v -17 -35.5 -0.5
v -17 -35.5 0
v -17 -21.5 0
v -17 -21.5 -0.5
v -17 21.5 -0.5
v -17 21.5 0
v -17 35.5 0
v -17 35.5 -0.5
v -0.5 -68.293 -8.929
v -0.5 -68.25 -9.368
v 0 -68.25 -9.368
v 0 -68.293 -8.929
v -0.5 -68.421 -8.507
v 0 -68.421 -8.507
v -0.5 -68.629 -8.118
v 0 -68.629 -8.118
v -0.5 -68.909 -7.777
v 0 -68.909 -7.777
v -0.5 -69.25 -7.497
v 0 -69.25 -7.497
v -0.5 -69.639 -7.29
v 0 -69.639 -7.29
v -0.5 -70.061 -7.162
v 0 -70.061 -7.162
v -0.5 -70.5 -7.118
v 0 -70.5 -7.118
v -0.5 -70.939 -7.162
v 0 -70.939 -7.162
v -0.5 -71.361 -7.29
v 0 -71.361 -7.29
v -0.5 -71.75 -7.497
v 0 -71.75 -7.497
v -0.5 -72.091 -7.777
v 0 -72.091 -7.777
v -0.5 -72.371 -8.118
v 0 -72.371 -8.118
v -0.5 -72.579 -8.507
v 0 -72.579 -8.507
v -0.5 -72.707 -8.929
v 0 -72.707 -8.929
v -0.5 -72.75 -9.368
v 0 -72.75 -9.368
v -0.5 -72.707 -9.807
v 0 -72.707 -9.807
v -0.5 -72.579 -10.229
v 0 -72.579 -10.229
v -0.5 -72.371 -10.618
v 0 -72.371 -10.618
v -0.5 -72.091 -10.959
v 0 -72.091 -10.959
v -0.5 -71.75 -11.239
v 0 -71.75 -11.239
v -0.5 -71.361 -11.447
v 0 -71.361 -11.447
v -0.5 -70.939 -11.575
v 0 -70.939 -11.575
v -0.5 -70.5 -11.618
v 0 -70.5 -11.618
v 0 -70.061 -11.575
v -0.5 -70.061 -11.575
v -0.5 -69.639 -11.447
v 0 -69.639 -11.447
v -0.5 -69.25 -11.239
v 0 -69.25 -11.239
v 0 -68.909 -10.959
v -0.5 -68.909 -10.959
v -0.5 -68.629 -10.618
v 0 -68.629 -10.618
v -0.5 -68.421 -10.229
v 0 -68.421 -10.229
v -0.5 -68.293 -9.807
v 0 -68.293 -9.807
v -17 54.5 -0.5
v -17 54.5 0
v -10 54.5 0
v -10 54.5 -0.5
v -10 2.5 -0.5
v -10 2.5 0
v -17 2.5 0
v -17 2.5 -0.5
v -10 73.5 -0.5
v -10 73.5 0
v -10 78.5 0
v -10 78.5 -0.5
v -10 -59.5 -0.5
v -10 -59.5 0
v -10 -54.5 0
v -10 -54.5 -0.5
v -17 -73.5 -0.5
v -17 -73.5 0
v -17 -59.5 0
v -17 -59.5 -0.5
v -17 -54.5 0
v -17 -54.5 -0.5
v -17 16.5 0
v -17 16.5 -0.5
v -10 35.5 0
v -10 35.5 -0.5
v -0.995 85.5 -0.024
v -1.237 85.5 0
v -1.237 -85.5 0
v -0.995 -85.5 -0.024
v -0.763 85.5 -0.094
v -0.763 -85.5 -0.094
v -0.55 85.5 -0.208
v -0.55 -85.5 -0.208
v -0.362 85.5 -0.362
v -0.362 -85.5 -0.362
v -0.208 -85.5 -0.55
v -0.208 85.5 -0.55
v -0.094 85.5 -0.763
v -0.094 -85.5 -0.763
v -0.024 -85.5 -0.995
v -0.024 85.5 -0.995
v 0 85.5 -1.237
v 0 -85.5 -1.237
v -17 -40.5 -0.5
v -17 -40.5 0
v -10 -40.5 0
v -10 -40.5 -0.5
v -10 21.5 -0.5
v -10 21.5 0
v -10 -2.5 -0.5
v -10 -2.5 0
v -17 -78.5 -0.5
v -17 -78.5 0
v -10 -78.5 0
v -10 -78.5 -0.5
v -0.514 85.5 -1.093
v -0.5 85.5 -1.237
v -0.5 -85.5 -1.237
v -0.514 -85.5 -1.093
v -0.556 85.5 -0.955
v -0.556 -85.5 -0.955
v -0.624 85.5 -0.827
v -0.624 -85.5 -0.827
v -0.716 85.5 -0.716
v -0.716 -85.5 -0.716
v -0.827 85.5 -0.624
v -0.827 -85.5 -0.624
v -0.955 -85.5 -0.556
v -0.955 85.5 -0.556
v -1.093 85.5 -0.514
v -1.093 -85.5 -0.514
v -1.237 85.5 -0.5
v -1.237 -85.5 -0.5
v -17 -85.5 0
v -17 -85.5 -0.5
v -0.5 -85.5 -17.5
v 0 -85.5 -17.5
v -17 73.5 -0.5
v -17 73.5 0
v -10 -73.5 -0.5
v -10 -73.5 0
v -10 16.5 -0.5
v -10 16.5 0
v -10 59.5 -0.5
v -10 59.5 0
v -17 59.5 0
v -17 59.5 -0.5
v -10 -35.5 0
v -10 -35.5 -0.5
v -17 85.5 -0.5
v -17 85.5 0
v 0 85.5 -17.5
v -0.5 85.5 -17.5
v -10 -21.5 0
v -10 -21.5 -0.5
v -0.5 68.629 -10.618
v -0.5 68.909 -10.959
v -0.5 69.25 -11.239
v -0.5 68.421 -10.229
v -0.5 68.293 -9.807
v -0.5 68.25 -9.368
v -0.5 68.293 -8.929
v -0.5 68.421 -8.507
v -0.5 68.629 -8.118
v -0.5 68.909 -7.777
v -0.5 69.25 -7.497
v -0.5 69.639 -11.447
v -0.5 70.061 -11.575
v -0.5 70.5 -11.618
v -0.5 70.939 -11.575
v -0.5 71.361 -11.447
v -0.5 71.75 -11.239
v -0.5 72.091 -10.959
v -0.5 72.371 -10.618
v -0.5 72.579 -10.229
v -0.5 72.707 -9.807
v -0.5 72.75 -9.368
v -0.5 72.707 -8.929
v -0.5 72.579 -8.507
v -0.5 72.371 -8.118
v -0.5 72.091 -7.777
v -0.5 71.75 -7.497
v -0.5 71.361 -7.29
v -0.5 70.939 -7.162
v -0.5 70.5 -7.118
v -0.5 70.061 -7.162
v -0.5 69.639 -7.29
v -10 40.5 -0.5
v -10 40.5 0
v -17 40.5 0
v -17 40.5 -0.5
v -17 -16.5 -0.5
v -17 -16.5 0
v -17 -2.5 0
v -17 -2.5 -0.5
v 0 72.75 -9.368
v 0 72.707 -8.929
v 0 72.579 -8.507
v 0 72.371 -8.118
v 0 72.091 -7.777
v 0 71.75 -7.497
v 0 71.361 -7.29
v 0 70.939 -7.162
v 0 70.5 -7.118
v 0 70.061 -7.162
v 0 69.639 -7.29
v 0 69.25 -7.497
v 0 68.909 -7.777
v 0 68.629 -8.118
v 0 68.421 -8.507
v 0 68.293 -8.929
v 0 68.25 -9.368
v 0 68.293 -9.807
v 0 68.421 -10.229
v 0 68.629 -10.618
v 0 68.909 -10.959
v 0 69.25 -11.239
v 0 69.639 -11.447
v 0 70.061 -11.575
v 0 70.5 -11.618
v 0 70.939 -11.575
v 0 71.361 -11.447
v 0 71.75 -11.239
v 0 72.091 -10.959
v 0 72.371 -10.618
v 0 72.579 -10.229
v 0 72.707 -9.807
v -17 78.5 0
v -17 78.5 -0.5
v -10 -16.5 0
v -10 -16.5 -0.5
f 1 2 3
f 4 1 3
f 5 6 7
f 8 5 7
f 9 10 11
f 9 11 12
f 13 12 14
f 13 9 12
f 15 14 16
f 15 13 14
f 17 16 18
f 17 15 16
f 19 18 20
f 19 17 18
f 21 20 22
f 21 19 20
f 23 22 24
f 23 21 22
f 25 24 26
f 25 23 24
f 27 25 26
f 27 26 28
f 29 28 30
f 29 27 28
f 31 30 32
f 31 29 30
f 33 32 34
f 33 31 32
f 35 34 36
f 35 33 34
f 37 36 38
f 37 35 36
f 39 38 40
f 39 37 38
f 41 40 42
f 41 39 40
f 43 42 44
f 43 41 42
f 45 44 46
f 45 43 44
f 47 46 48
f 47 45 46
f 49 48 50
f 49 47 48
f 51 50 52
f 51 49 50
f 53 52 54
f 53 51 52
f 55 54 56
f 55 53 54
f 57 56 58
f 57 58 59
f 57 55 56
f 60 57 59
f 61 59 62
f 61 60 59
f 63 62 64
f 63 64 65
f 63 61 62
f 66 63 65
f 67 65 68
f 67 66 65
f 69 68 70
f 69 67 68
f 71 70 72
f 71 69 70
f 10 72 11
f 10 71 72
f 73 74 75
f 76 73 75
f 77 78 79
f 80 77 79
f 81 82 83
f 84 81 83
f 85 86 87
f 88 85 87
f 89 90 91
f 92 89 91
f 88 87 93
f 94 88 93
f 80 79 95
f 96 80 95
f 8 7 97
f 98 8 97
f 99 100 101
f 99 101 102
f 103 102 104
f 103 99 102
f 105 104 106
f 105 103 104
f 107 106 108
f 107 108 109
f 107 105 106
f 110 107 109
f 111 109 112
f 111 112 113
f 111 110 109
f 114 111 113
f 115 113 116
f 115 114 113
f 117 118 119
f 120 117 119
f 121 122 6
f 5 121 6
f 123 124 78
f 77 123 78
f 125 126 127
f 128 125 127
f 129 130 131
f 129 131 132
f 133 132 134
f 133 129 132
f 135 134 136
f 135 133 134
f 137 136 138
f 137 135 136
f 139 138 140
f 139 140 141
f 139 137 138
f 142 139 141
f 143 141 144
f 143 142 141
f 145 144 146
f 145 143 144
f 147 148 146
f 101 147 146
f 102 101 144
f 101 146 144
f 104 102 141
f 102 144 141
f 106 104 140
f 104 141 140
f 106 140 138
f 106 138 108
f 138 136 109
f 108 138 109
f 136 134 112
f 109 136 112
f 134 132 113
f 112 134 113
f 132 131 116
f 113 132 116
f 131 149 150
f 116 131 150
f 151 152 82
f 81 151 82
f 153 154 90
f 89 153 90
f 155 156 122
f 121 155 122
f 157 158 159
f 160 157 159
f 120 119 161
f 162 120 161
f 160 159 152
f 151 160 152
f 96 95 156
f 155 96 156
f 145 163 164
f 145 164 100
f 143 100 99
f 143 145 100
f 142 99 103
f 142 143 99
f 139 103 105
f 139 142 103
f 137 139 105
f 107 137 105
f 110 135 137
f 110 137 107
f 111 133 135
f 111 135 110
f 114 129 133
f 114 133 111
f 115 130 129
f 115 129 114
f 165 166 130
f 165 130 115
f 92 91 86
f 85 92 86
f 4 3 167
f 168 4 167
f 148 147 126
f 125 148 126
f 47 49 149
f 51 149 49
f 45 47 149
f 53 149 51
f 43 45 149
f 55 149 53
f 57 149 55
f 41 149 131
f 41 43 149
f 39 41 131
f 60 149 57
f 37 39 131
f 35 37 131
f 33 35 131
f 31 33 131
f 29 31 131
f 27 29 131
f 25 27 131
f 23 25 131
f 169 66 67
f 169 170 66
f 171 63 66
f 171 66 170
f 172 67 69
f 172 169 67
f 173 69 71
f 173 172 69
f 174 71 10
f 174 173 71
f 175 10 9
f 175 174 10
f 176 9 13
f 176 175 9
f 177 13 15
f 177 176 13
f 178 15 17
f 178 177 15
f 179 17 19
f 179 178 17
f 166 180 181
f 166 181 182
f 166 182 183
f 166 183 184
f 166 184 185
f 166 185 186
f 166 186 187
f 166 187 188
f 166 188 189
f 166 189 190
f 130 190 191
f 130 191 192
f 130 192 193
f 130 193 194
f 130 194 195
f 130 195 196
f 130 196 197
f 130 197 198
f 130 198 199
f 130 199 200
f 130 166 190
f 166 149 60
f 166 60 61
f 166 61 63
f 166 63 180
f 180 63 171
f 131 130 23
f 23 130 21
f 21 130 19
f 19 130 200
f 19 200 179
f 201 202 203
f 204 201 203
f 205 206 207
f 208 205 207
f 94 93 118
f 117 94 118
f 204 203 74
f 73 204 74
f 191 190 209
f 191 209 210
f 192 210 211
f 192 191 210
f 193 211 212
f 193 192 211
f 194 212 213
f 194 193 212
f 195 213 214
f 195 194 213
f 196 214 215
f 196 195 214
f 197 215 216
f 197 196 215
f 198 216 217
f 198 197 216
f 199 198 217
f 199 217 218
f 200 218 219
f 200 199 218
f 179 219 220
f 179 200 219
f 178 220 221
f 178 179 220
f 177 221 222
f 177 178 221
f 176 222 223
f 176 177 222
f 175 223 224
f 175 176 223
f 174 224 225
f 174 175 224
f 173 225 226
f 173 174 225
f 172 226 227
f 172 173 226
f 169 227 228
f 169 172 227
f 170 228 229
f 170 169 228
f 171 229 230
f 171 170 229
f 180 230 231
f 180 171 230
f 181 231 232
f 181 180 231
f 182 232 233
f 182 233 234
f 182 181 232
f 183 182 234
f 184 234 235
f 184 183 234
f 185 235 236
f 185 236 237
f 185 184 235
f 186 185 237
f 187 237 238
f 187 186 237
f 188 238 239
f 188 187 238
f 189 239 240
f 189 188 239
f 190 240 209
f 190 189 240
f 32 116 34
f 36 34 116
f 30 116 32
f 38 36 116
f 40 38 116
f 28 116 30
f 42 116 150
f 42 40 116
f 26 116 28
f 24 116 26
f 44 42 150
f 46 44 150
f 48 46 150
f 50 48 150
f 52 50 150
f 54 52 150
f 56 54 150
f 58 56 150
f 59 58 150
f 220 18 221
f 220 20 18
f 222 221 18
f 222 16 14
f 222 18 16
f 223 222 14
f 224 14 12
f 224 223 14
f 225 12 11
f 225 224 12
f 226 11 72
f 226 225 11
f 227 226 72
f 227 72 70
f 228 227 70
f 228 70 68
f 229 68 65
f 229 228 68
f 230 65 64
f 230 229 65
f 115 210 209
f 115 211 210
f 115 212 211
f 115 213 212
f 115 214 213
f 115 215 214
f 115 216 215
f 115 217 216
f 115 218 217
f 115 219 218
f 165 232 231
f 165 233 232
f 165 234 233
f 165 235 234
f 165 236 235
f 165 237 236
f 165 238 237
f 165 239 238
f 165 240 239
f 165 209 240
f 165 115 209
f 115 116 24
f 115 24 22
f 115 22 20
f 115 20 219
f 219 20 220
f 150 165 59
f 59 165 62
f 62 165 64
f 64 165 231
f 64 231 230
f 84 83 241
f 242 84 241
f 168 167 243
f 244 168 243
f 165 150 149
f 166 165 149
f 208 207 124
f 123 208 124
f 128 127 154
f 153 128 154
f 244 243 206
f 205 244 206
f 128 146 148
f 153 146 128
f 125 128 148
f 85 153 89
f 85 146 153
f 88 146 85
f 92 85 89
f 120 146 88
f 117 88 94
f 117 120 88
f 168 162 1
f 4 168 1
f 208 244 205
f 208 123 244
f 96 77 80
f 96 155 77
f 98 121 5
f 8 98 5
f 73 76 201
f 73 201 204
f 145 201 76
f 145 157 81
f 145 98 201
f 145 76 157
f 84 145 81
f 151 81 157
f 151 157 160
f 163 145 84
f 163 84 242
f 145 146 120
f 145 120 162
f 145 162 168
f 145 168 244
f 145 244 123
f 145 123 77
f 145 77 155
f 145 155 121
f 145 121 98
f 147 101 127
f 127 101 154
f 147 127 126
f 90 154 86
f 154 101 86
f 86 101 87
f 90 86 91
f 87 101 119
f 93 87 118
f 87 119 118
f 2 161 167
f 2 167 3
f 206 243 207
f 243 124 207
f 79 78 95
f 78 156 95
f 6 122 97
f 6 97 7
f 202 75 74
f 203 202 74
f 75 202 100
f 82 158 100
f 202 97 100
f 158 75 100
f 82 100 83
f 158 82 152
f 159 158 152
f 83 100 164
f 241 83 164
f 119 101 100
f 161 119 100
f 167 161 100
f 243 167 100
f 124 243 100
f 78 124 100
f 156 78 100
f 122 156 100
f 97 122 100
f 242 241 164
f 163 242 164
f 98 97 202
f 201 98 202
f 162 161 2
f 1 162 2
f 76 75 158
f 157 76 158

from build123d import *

# Parameters (mm, degrees)
T_LE_DE_BASE_PLI_E1_DEPTH             = 0.5
T_LE_PLI_E_SUR_AR_TE1_STRIP_W         = 3.4732
T_LE_PLI_E_SUR_AR_TE1_STRIP_H         = 0.5
T_LE_PLI_E_SUR_AR_TE1_STRIP_CUT_DEPTH = 171
T_LE_PLI_E_SUR_AR_TE1_DEPTH           = 171
PER_AGE1_START                        = -0.5
PER_AGE1_OUTLINE_R                    = 2.25
PER_AGE1_DEPTH                        = 0.5


# Read off the part's stored shape, not the designer's step: Perçage1
# Sheet-metal steps are written as plain solids
with BuildPart() as part:
    # Esquisse1 → Tôle de base pliée1 (new body)
    with BuildSketch(Plane.XY):
        Polygon((0, -85.5), (-17, -85.5), (-17, -78.5), (-10, -78.5), (-10, -73.5), (-17, -73.5), (-17, -59.5), (-10, -59.5), (-10, -54.5), (-17, -54.5), (-17, -40.5), (-10, -40.5), (-10, -35.5), (-17, -35.5), (-17, -21.5), (-10, -21.5), (-10, -16.5), (-17, -16.5), (-17, -2.5), (-10, -2.5), (-10, 2.5), (-17, 2.5), (-17, 16.5), (-10, 16.5), (-10, 21.5), (-17, 21.5), (-17, 35.5), (-10, 35.5), (-10, 40.5), (-17, 40.5), (-17, 54.5), (-10, 54.5), (-10, 59.5), (-17, 59.5), (-17, 73.5), (-10, 73.5), (-10, 78.5), (-17, 78.5), (-17, 85.5), (0, 85.5), align=None)
    extrude(amount=-T_LE_DE_BASE_PLI_E1_DEPTH)

    # Tôle pliée sur arête1 strip (across the edge) → Tôle pliée sur arête1 strip cut (cut)
    with BuildSketch(Plane(origin=(0, 85.5, -0.5), x_dir=(-1, 0, 0), z_dir=(0, -1, 0))):
        with Locations((-0.5, -0.25)):
            Rectangle(T_LE_PLI_E_SUR_AR_TE1_STRIP_W, T_LE_PLI_E_SUR_AR_TE1_STRIP_H)
    extrude(amount=T_LE_PLI_E_SUR_AR_TE1_STRIP_CUT_DEPTH, mode=Mode.SUBTRACT)

    # Tôle pliée sur arête1 section (across the edge) → Tôle pliée sur arête1 (add)
    with BuildSketch(Plane(origin=(0, 85.5, -0.5), x_dir=(-1, 0, 0), z_dir=(0, -1, 0))):
        with BuildLine():
            Line((0, 0.7366), (0, 17))
            Line((0, 17), (0.5, 17))
            Line((0.5, 17), (0.5, 0.7366))
            ThreePointArc((0.5, 0.7366), (0.715745145, 0.215745145), (1.2366, 0))
            Line((1.2366, 0), (1.2366, -0.5))
            ThreePointArc((1.2366, -0.5), (0.362191754, -0.137808246), (0, 0.7366))
        make_face()
    extrude(amount=T_LE_PLI_E_SUR_AR_TE1_DEPTH)

    # Perçage1 outline → Perçage1 (cut)
    with BuildSketch(Plane.YZ.offset(PER_AGE1_START)):
        with Locations((-70.5, -9.3683)):
            Circle(PER_AGE1_OUTLINE_R)
        with Locations((70.5, -9.3683)):
            Circle(PER_AGE1_OUTLINE_R)
    extrude(amount=PER_AGE1_DEPTH, mode=Mode.SUBTRACT)


solid = part.part
